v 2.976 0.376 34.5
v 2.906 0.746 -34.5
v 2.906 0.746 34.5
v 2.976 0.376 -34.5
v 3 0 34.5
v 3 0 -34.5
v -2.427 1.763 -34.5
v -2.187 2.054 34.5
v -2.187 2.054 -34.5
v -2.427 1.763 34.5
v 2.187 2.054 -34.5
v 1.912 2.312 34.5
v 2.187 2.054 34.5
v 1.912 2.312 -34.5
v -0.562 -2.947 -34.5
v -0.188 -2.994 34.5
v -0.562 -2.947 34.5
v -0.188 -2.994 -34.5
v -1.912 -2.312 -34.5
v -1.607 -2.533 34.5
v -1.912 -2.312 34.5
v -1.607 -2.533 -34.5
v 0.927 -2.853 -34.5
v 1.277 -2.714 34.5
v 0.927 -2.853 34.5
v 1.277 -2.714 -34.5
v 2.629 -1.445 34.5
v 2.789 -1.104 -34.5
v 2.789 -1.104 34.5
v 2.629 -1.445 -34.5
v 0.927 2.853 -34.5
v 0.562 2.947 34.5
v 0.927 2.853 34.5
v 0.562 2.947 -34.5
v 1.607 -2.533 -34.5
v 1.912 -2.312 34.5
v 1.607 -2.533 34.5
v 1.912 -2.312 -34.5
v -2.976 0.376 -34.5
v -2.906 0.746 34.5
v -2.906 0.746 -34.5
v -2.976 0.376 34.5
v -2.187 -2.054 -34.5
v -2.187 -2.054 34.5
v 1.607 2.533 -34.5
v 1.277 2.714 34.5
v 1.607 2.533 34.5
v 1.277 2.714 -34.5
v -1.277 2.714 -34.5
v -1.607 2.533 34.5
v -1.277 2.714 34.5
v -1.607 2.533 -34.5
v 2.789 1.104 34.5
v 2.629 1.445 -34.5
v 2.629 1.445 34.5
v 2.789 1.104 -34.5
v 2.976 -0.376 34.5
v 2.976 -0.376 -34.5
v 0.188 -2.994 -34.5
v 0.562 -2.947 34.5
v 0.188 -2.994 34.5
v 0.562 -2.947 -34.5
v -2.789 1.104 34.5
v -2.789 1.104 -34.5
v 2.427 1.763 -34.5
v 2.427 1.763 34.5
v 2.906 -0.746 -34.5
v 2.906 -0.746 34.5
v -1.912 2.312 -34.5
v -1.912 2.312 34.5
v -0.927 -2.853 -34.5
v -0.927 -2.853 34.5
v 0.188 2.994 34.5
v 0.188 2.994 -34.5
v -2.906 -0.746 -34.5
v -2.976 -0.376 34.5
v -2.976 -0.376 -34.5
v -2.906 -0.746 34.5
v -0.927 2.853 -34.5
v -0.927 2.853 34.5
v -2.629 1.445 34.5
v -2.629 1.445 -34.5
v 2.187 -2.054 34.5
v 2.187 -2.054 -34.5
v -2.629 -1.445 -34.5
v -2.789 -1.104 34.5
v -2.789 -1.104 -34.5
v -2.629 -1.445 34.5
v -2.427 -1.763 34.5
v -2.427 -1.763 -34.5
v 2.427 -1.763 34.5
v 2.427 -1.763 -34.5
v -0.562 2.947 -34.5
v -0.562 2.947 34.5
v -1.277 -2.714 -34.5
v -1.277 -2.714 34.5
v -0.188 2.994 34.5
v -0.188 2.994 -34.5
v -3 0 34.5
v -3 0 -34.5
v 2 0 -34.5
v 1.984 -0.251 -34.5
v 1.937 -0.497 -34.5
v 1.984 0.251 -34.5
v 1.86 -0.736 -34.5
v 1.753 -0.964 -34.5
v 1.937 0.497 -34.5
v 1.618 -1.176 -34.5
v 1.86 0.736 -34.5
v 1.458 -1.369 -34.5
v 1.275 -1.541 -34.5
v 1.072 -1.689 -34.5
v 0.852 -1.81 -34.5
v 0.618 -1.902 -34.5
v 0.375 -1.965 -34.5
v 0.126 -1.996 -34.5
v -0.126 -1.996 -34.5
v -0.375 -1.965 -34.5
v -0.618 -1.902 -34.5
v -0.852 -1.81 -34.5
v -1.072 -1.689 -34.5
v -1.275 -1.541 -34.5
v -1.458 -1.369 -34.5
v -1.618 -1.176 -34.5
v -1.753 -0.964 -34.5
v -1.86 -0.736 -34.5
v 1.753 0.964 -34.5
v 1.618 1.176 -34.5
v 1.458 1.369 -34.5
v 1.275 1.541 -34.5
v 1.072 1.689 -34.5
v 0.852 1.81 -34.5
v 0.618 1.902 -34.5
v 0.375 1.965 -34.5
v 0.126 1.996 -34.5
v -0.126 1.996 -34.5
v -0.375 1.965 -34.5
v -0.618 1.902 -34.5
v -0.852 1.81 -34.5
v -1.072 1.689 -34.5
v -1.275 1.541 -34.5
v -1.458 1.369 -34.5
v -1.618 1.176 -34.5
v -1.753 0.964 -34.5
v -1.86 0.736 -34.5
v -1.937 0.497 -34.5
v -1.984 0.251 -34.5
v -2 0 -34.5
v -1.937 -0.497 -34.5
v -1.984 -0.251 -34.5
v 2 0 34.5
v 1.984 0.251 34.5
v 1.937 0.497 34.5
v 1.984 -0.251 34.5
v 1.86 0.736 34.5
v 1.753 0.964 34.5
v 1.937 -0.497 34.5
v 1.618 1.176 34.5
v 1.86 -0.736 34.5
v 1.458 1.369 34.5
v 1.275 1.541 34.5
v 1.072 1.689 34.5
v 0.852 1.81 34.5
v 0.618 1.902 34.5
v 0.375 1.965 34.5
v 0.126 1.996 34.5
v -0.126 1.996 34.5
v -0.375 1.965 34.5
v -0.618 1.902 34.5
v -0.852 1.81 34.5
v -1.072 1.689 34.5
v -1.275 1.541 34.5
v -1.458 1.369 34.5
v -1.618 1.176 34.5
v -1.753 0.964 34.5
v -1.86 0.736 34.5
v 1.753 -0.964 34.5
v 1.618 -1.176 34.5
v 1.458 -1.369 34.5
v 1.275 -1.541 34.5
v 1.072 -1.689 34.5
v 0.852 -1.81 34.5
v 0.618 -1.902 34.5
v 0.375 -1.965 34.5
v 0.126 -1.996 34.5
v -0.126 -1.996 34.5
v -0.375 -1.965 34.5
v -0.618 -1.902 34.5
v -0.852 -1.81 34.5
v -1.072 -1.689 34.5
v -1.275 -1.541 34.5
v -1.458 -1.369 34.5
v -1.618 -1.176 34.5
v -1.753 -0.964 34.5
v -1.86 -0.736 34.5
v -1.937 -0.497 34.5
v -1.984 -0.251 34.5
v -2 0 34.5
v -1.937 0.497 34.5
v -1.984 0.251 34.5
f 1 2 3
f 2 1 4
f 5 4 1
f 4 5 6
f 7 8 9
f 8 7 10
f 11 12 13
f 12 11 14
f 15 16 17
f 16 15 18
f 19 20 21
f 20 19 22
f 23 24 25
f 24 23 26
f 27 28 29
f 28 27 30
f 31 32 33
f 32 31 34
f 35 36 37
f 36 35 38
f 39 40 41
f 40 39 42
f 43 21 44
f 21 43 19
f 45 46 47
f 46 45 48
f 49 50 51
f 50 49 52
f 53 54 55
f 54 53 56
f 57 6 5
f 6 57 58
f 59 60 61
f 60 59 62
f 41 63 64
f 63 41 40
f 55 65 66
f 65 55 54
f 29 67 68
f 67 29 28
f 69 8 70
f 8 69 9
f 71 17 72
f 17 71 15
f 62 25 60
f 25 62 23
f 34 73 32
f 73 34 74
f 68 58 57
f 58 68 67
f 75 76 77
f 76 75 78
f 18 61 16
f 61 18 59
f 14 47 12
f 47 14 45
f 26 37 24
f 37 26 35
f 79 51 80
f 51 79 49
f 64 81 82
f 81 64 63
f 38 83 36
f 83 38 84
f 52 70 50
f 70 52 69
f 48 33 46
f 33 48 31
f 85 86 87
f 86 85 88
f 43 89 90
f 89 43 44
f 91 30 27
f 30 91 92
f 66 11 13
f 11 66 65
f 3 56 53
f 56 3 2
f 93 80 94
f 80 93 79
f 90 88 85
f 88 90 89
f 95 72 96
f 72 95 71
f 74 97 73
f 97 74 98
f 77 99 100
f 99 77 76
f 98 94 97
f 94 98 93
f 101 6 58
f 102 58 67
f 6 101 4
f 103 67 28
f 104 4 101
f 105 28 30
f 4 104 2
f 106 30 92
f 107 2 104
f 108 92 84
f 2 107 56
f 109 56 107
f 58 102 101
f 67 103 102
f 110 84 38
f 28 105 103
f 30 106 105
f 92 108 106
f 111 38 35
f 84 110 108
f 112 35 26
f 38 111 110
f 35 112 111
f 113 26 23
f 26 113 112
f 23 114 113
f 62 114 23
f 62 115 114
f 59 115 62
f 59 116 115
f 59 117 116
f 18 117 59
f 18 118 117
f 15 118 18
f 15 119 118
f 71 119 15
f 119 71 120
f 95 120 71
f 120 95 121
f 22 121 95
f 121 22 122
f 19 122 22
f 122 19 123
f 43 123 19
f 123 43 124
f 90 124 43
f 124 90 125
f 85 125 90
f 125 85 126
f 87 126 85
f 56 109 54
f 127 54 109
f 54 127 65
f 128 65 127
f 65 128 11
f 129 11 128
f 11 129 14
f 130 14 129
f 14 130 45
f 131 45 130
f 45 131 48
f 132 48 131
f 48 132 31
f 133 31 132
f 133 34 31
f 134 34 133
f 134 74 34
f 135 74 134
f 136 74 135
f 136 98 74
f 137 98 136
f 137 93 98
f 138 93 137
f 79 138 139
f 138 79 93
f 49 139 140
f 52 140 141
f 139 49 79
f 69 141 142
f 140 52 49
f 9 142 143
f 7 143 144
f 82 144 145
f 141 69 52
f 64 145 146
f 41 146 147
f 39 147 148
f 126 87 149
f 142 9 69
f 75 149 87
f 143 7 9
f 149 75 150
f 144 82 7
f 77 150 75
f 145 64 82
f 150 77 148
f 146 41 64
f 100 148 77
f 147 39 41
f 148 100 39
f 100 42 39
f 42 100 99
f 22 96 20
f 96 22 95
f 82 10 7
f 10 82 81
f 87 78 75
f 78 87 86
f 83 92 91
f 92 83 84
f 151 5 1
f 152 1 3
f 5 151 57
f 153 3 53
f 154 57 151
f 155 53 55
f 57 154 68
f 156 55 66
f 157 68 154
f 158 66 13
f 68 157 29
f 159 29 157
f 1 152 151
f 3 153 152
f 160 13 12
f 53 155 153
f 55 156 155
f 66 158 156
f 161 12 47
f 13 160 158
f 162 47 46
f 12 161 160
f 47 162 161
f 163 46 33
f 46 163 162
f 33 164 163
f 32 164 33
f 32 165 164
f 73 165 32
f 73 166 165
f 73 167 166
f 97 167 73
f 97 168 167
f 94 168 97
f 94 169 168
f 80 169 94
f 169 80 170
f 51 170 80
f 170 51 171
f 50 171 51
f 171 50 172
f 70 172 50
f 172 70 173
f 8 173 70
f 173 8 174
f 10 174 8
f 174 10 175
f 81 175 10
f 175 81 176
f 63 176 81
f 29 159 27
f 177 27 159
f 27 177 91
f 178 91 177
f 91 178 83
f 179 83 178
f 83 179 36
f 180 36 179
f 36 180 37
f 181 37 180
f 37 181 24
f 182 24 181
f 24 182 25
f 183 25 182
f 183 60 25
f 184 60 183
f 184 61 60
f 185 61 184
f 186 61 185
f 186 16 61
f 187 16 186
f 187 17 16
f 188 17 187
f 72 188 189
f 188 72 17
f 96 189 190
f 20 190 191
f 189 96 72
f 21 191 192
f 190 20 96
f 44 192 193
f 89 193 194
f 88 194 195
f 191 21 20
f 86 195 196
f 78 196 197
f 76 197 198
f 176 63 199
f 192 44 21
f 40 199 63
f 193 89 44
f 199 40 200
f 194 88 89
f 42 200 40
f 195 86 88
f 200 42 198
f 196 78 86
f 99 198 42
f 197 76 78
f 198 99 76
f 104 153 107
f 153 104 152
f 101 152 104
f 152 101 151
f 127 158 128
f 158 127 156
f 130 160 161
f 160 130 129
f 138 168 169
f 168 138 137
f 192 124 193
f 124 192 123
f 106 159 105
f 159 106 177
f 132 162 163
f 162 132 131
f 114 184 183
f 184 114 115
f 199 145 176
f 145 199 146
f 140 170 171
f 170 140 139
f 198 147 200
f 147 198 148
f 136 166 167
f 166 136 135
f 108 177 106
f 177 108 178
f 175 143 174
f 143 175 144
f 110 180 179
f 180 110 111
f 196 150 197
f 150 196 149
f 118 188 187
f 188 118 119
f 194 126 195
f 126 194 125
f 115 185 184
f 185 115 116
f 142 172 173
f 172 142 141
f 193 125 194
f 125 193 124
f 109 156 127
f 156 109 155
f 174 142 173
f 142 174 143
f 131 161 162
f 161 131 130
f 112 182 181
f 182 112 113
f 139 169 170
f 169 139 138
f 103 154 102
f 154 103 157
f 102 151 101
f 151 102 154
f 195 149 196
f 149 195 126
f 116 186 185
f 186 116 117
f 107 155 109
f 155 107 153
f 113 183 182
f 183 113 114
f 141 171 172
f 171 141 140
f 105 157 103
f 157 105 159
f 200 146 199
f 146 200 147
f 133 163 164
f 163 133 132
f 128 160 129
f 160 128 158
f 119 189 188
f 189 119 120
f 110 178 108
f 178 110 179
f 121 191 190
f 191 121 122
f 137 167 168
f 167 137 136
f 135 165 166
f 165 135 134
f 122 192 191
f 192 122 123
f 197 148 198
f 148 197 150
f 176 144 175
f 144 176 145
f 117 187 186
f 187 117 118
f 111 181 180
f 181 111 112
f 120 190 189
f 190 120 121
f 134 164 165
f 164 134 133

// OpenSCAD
$fn = 50;


difference() {
	union() {
		translate(v = [0, 0, -34.5000000000]) {
			cylinder(h = 69, r = 3.0000000000);
		}
	}
	union() {
		translate(v = [0, 0, -100.0000000000]) {
			cylinder(h = 200, r = 2.0000000000);
		}
	}
}
